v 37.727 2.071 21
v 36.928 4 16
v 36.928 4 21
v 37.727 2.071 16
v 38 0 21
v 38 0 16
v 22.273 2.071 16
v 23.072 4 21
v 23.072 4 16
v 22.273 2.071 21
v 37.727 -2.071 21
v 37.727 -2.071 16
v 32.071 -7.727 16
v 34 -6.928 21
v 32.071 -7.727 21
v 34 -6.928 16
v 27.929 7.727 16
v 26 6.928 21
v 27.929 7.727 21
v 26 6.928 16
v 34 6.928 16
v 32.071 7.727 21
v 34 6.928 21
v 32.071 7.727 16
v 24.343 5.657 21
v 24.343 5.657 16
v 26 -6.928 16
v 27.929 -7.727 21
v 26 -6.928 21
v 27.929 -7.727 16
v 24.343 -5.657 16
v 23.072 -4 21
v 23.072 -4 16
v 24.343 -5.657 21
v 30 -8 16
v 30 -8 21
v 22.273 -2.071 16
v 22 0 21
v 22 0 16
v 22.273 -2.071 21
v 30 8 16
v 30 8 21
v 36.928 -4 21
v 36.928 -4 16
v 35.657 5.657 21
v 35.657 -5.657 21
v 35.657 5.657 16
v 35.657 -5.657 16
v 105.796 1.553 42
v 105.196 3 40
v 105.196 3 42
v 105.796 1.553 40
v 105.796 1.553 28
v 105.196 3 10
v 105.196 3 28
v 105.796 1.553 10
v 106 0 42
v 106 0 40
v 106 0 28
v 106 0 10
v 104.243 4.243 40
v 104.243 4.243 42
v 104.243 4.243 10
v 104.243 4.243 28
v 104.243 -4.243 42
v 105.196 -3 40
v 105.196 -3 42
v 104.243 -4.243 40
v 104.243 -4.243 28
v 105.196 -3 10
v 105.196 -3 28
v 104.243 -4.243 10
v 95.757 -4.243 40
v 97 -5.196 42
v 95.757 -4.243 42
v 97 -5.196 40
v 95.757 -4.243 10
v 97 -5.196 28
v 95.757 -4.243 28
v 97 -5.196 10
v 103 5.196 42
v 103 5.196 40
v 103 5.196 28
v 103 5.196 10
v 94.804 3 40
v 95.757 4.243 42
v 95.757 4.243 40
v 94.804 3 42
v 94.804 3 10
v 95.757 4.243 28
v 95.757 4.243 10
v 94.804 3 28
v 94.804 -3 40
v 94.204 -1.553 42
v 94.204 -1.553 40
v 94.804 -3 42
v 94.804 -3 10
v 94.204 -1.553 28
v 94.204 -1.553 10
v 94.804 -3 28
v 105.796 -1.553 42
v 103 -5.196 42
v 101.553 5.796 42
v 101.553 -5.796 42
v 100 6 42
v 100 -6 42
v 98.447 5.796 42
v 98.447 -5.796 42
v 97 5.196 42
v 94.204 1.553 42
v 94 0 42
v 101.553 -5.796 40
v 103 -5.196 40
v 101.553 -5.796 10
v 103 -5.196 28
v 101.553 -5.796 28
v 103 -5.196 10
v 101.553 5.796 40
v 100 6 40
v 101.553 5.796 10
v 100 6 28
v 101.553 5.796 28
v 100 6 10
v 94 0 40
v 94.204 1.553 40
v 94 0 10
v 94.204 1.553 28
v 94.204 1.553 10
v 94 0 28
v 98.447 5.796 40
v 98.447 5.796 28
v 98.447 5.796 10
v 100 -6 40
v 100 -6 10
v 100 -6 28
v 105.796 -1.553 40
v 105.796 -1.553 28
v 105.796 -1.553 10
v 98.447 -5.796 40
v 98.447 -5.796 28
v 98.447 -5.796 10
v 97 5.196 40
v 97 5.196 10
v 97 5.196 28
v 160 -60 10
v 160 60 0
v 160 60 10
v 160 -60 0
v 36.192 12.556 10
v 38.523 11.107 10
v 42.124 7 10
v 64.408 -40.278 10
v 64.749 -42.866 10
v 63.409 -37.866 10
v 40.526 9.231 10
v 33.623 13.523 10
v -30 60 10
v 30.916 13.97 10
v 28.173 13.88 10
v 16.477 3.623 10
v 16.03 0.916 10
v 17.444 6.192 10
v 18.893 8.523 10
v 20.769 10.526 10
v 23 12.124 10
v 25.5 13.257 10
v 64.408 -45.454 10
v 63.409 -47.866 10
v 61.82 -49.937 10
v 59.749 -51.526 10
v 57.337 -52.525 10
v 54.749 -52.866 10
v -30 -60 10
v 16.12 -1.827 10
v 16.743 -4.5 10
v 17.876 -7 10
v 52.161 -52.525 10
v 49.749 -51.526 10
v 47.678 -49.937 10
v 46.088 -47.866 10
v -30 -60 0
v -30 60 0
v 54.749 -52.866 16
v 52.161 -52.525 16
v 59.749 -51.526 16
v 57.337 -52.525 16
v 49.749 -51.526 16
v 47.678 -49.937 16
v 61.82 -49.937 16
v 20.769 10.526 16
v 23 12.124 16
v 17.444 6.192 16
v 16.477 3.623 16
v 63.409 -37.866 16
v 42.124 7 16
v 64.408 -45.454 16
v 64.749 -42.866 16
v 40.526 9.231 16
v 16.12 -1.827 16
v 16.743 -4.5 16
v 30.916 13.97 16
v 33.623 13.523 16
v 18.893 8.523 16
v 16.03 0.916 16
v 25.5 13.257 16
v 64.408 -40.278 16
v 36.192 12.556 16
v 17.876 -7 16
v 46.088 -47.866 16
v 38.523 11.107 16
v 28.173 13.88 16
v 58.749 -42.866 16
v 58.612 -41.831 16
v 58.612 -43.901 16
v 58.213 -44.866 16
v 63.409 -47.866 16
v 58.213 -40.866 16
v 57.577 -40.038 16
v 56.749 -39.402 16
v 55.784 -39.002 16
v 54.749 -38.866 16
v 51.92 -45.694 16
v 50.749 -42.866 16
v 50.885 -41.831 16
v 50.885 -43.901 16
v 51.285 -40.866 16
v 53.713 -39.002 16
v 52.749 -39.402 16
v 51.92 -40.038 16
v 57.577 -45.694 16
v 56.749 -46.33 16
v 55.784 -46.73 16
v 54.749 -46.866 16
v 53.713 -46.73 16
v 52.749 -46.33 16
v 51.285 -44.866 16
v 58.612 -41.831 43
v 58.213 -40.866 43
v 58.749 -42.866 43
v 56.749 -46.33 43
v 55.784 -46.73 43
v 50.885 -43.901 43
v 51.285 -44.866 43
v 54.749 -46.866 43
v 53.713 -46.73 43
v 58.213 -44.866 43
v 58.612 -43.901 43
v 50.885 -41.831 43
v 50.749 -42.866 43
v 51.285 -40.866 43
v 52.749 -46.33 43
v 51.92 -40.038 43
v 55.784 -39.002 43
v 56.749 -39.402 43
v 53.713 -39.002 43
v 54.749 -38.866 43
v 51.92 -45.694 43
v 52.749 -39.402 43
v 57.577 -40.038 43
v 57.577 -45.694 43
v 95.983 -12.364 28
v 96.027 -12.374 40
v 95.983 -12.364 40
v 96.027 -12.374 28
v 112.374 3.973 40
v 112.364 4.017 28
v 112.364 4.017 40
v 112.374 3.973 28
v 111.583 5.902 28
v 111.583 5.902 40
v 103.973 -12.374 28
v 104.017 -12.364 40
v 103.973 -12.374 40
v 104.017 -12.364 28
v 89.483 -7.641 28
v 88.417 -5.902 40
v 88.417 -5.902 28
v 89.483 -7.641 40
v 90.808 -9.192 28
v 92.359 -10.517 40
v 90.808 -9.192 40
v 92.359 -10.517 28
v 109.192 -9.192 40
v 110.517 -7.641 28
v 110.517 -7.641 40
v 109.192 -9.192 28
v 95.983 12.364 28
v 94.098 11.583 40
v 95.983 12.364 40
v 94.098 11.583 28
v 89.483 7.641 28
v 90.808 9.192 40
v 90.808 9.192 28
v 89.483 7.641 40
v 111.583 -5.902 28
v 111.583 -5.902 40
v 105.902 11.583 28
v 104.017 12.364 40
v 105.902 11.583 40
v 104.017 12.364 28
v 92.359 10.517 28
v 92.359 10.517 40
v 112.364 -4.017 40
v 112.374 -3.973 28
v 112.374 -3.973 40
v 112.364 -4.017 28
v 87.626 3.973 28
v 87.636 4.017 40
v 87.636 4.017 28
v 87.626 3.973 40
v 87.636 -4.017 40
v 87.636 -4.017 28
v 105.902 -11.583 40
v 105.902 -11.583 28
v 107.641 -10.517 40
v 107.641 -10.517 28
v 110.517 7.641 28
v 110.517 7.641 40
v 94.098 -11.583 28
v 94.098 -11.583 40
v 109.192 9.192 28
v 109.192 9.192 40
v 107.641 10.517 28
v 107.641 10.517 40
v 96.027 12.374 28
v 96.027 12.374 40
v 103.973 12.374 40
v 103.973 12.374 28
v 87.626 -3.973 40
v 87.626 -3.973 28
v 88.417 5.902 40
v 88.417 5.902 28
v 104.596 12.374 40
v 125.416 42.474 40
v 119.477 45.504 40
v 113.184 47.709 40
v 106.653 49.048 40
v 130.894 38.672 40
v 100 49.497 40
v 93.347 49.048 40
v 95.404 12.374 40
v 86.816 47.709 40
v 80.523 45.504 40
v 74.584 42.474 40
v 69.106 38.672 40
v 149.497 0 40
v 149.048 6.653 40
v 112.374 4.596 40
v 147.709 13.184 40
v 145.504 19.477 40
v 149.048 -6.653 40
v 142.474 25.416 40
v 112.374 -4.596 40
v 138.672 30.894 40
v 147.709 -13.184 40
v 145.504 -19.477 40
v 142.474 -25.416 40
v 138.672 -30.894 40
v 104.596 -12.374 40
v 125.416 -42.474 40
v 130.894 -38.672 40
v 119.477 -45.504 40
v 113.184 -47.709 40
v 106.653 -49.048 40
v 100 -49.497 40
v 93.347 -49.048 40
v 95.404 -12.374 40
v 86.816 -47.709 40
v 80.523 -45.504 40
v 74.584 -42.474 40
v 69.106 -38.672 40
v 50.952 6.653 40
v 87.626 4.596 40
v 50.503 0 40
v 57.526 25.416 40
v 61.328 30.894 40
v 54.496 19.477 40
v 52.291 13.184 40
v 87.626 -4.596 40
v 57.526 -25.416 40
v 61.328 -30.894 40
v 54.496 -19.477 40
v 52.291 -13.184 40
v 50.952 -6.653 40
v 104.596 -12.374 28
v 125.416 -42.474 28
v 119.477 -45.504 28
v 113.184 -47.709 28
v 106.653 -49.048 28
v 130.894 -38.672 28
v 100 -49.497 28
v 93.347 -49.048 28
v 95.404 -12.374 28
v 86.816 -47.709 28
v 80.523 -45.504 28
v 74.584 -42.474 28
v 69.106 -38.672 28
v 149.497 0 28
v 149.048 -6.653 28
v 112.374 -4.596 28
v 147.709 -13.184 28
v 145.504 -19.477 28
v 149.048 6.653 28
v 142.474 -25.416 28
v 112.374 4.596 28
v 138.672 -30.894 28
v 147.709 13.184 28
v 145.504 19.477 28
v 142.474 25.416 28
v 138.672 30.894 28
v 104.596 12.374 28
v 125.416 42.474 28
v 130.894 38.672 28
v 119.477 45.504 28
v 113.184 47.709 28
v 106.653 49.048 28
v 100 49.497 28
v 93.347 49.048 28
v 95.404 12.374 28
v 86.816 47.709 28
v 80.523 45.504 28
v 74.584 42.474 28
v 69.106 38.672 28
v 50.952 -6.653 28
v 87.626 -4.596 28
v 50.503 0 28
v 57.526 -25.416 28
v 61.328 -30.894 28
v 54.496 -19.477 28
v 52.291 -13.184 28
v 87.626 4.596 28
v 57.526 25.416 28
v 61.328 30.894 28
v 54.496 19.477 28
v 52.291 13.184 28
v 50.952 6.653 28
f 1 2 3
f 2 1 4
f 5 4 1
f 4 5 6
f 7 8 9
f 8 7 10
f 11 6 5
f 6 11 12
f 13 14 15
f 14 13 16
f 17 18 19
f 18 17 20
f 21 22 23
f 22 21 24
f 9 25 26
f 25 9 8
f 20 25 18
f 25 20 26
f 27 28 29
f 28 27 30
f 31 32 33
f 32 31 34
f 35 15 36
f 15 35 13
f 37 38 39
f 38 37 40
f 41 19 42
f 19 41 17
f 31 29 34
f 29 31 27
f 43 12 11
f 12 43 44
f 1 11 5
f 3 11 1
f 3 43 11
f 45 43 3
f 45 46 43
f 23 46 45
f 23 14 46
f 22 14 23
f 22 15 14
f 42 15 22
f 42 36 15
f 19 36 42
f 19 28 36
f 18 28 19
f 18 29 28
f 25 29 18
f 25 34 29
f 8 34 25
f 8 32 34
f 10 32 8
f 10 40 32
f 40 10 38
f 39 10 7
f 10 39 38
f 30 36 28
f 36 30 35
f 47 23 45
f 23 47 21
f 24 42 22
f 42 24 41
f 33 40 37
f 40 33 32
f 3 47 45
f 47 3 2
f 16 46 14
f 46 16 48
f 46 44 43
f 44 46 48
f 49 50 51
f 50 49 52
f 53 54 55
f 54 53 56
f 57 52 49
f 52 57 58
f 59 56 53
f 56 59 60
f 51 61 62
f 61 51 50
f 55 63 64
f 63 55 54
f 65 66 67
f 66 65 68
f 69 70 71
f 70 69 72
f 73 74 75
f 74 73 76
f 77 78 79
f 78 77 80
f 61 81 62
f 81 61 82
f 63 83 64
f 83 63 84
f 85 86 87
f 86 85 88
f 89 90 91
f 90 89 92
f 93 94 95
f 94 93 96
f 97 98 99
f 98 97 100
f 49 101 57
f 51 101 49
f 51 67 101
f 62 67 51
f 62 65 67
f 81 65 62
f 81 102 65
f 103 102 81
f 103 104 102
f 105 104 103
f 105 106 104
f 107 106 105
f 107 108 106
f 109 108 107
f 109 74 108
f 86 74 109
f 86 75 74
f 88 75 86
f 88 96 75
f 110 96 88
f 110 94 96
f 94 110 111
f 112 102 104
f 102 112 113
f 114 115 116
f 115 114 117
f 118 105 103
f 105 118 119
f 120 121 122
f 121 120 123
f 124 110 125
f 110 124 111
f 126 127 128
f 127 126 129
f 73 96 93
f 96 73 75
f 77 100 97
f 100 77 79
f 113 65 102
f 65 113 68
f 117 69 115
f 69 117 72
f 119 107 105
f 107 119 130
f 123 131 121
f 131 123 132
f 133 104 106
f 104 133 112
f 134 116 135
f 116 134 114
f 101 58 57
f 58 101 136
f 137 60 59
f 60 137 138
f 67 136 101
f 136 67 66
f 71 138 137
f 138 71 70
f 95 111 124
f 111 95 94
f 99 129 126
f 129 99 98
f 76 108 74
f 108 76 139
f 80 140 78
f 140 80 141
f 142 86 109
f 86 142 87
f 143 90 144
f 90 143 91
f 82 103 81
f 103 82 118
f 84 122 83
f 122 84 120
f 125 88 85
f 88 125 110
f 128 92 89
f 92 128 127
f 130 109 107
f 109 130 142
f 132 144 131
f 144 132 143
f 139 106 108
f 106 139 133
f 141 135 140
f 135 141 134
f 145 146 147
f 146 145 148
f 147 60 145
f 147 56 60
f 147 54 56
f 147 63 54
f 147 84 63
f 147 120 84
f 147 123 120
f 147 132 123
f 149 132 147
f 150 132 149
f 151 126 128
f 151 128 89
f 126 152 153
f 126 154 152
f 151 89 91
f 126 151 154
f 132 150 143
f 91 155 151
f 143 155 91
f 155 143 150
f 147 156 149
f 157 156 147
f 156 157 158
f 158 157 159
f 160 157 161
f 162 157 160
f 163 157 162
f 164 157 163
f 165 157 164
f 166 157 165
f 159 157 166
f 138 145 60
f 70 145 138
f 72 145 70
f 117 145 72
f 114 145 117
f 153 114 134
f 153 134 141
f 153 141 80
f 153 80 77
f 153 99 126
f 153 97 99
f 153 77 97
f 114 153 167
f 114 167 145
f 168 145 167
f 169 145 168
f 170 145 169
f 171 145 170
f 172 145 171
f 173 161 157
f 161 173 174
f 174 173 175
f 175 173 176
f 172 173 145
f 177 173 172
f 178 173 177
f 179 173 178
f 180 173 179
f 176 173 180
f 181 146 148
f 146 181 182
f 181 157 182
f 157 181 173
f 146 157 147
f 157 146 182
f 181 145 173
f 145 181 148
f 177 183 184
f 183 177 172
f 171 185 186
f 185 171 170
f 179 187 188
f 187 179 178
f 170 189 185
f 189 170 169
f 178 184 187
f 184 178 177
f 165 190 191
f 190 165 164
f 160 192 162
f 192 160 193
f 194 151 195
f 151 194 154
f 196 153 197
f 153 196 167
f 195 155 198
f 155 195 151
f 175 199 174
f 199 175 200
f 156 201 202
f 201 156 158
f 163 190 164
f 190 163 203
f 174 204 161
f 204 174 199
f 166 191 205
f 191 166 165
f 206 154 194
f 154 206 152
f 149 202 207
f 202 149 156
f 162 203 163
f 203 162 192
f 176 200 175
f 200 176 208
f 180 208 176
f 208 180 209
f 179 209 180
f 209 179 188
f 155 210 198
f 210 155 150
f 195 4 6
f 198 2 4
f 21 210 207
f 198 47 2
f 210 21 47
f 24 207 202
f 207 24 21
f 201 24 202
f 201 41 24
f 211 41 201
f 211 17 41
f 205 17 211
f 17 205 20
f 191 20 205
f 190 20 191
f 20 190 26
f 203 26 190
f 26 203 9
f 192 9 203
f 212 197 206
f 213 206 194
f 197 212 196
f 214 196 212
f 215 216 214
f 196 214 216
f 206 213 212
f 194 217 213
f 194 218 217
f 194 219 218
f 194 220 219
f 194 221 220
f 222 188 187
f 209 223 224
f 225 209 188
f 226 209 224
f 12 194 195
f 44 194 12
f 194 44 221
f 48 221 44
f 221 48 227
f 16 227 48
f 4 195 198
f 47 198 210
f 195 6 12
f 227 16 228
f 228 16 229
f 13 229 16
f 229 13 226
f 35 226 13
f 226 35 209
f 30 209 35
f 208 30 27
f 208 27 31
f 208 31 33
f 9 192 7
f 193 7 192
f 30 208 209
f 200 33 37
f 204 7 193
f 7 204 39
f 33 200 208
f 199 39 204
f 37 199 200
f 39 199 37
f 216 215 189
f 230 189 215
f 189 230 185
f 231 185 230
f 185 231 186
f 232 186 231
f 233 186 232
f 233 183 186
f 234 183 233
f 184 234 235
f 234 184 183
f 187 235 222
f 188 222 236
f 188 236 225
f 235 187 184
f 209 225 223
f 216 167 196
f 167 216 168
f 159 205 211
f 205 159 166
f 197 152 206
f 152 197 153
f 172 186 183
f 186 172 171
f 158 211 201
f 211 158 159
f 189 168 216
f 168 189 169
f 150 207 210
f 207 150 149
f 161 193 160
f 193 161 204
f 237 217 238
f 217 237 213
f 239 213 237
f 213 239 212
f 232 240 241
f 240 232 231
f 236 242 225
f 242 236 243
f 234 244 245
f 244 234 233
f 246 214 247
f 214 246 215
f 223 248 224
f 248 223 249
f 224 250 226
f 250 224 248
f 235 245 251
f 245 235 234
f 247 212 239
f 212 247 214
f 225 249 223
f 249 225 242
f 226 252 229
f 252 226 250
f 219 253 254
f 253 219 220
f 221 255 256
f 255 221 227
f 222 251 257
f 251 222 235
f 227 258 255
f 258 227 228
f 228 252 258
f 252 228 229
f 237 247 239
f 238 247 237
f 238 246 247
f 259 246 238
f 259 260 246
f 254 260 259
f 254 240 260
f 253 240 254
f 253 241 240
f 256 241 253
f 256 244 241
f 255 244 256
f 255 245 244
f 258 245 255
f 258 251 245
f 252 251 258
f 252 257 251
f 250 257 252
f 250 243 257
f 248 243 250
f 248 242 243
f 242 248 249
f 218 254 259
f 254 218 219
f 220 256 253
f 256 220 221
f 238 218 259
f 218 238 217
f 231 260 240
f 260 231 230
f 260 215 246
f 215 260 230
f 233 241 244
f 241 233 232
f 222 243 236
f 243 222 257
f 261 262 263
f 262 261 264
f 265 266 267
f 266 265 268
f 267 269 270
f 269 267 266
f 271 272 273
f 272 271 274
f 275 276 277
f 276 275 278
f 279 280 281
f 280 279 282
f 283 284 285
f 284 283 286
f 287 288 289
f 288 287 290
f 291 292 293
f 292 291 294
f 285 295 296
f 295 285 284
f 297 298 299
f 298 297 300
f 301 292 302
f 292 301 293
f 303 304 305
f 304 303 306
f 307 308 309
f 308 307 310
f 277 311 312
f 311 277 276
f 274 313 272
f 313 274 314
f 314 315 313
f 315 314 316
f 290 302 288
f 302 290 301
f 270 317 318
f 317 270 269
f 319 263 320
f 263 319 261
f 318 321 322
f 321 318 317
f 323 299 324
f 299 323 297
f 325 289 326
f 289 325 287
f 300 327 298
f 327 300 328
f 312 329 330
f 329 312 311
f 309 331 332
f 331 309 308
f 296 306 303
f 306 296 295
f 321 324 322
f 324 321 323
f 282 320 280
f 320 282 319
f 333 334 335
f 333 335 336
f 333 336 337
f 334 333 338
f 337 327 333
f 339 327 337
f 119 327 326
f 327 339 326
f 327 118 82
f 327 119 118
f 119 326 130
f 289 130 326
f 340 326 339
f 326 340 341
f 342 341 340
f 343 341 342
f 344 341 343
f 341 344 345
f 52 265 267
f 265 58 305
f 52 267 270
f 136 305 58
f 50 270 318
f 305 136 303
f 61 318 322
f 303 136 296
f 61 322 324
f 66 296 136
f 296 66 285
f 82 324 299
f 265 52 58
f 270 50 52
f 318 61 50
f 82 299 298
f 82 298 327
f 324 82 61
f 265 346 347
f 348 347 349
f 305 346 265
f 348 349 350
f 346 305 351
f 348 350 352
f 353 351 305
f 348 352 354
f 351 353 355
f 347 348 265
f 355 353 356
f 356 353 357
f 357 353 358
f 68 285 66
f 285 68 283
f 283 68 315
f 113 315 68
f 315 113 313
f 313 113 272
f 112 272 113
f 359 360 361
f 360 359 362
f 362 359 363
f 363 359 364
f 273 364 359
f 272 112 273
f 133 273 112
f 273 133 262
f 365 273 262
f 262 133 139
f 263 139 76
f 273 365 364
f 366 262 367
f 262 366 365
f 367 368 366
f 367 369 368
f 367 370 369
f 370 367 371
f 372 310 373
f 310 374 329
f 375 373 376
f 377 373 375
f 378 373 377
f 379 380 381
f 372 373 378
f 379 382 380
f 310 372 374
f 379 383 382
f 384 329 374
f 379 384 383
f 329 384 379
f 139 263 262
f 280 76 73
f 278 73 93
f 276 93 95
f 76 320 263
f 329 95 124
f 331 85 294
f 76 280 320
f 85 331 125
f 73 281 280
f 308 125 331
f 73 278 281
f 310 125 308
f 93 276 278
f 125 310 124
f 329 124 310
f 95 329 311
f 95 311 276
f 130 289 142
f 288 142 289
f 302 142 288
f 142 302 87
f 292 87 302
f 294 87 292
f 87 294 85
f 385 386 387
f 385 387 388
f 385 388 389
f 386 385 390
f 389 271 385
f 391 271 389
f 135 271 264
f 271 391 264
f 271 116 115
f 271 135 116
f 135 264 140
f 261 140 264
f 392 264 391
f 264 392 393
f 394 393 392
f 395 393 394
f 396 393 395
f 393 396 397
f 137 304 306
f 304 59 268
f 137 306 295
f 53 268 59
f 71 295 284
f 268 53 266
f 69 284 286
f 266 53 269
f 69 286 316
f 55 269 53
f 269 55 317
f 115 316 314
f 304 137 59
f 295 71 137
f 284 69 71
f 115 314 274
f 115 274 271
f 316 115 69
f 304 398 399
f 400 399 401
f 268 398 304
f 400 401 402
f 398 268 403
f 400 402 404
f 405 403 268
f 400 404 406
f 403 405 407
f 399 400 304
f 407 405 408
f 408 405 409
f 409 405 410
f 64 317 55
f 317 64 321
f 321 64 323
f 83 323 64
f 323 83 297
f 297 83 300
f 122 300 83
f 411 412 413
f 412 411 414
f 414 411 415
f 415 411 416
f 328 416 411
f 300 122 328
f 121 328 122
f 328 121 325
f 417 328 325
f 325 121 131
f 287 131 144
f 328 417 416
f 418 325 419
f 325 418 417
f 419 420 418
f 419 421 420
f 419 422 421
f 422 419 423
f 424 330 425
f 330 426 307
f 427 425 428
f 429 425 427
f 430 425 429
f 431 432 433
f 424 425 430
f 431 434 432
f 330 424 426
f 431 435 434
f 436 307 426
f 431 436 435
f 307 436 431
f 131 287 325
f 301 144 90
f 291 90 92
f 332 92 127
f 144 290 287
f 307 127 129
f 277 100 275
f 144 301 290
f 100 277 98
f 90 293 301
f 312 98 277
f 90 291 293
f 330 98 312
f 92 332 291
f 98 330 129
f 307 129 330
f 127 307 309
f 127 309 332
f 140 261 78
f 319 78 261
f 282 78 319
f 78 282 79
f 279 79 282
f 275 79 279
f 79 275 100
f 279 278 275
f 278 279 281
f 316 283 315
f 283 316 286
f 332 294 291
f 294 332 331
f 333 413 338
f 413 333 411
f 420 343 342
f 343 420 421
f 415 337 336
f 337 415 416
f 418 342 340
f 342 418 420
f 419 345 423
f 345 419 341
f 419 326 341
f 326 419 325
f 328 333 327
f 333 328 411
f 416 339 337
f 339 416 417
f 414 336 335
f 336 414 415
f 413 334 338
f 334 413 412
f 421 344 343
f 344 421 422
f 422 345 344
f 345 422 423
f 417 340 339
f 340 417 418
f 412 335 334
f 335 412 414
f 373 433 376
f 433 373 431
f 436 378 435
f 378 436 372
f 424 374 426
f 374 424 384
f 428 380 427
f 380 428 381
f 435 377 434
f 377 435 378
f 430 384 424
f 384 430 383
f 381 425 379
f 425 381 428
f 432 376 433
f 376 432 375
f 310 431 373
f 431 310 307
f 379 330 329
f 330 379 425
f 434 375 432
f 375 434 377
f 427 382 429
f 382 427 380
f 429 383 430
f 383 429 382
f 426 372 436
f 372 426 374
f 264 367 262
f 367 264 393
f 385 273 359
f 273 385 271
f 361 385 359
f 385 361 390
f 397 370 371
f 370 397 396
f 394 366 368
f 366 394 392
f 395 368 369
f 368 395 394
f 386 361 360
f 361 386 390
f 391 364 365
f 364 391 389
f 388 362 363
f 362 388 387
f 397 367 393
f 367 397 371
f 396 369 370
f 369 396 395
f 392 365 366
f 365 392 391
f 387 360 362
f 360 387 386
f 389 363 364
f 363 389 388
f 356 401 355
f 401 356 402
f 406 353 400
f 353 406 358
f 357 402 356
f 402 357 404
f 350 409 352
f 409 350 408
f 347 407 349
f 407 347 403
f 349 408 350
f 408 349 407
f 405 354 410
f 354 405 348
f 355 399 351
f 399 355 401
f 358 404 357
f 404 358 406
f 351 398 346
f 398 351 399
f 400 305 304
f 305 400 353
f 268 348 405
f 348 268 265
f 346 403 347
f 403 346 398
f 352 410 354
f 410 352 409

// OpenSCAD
// A Geneva wheel: continuous in, four steps and four stops out.
//
// The driver turns steadily and never stops. The wheel turns a quarter of a turn,
// stops dead, waits three quarters of the driver's revolution, and does it again.
// Nothing here says "index" or "dwell" or "90 degrees". There is a pin on a
// crank, four slots in a disc, and the arithmetic that decides where they go.
//
// That arithmetic is the whole model. For an n-slot wheel at centre distance C,
//
//     crank radius   a = C·sin(180/n)
//     wheel radius   b = C·cos(180/n)
//
// and a² + b² = C² is not a coincidence — it is the condition that the pin's
// circular path crosses the wheel's rim at exactly the angle the slot points.
// Get it right and the pin enters the slot *along* it rather than across it,
// and — this is the part worth watching — the wheel's speed is zero at the moment
// of entry and zero again at exit. It is accelerated from rest and brought back
// to rest by the geometry, which is why a Geneva can be run fast without
// hammering itself apart, and why it needs no brake to hold still between steps.
// It arrives stopped.
//
// The four-slot version is the one that ran cinema projectors: 24 frames a
// second, each yanked into the gate and held perfectly still while it was lit.
//
// ---------------------------------------------------------------------------
// It is built out of convex pieces, and that is the engineering of this model
// rather than a detail of it.
//
// A moving part's collider is its convex hull. A slotted disc's hull is a disc —
// the slots fill straight back in, the pin rides round the outside, and there is
// no mechanism at all. `collider = "decompose"` exists for exactly this, and was
// the first thing tried: it splits a concave part into convex pieces at a cost of
// about a voxel of accuracy. Here that voxel *is* the mechanism. Every clearance
// in a Geneva is a millimetre or two — the fit of the pin in its slot, the depth
// the slot is cut to, the air under the crank — and a collider a voxel oversize
// closes all of them at once. It jammed three separate ways: after 0.9° of the
// first revolution, then after 39°, then after 55°, each time with clear air
// where the drawing said there was clearance and the interference check agreeing
// there was.
//
// So the wheel is a hub with four petals bolted to it, each petal convex, and the
// slots are the gaps between them. Eight parts and six welds against one part and
// none, and every surface is exactly where it was drawn.

module part(name, fixed = false, density = undef, mass = undef,
            collider = undef, friction = undef, bounce = undef) { children(); }
module hinge(name, parts, at, axis, range) { }
module weld(name, parts, at, axis) { }
module drive(name, to, over, at, torque, speed) { }

STEEL   = 0.0078;       // g/mm³
PLASTIC = 0.0012;
DECK    = 10;

SLOTS = 4;
C = 70;                                 // centre distance
A = C * sin(180 / SLOTS);               // the crank's radius: 49.50
B = C * cos(180 / SLOTS);               // and the wheel's:    49.50
PIN = 4;                                // the pin
FIT = 1.5;                              // and its clearance in the slot
HALF = PIN + FIT;                       // so the slot comes out 11 wide

// How deep the slot is cut. The pin's own path bottoms out at C − a = 20.5 from
// the wheel's centre, so its inner face never comes nearer than 16.5; cutting to
// 12 leaves four and a half millimetres it will never need.
SLOT_IN = 12;
HUB = 13;                               // and the hub fills what is left

DRIVE_AT = [30, 0, DECK];
WHEEL_AT = [DRIVE_AT[0] + C, 0, DECK];

// The wheel sits *above* the crank, and only the pin comes up into its plane.
// That is not a detail either — it is the only way the two can overlap at all.
// The crank sweeps a circle 120 mm across about a centre 70 from the wheel, and
// the wheel is 99 across: in one plane they would foul for most of every
// revolution. In two, with a pin bridging them, they meet only where they should.
CRANK_T = 6;
CLEAR   = 12;
WHEEL_Z = DECK + CRANK_T + CLEAR;
THICK   = 12;

// Drawn 15° before the pin reaches the rim, so the first index starts at once and
// there is room for two. Entry is at exactly −45°: cos φ = C / 2a, and with
// a = C/√2 that is √2/2.
START = -60;

// ---- the driver ------------------------------------------------------------
// The crank, and the pin as a separate part bolted to it — which looks like
// over-engineering and is the other thing that makes this mechanism run.
//
// Drawn as one part, the hull of a flat crank with a tall thin pin at one end of
// it is neither: it is the tapered wedge *between* them, swelling from the pin's
// 4 mm at the top to the crank's 10 at the bottom. That wedge fills exactly the
// gap the crank was dropped out of the wheel's plane to make, and the two touch
// through it. The symptom was a crank that turned to the same angle whatever it
// started from — from −60°, from −90°, from −180°, always to −56° — and stopped
// dead there, with 4.6 mm of clear air between the pin and the rim.
part("driver", density = STEEL)
    color("indianred") translate(DRIVE_AT) rotate([0, 0, START])
        hull() {
            cylinder(h = CRANK_T, r = 14, $fn = 32);
            translate([A, 0, 0]) cylinder(h = CRANK_T, r = 10, $fn = 24);
        }
hinge("crank", parts = ["driver", "frame"], at = DRIVE_AT, axis = [0, 0, 1]);
drive("crank", speed = 180, torque = 4000000);

PIN_AT = [DRIVE_AT[0] + A * cos(START), A * sin(START), DRIVE_AT[2] + CRANK_T - 1];
part("pin", density = STEEL)
    color("firebrick") translate(PIN_AT)
        cylinder(h = CLEAR + THICK + 4, r = PIN, $fn = 24);
weld("pin_bolts", parts = ["pin", "driver"], at = PIN_AT, axis = [0, 0, 1]);

// ---- the wheel -------------------------------------------------------------
// A hub, and four petals bolted to it. Each petal is bounded by two straight slot
// walls, an arc of the rim, and a chord across its inside — convex, so its hull
// is its shape and the slot beside it is exactly as wide as it was drawn.
function petal(i, steps) =
    let (s0 = 180 / SLOTS + i * 360 / SLOTS,
         s1 = s0 + 360 / SLOTS,
         d  = asin(HALF / B))
    concat(
        [[SLOT_IN * cos(s0) - HALF * sin(s0), SLOT_IN * sin(s0) + HALF * cos(s0)]],
        [for (k = [0 : steps])
            let (t = (s0 + d) + ((s1 - d) - (s0 + d)) * k / steps)
            [B * cos(t), B * sin(t)]],
        [[SLOT_IN * cos(s1) + HALF * sin(s1), SLOT_IN * sin(s1) - HALF * cos(s1)]]);

module petal_at(i) {
    translate([WHEEL_AT[0], WHEEL_AT[1], WHEEL_Z])
        linear_extrude(height = THICK) polygon(points = petal(i, 10));
}
// Where a petal's inner chord crosses the hub, which is where its bolts go.
function spoke(i) =
    let (t = 90 + i * 90)
    [WHEEL_AT[0] + 12.6 * cos(t), WHEEL_AT[1] + 12.6 * sin(t), WHEEL_Z + THICK / 2];

part("hub", density = PLASTIC, friction = 0.05)
    color("steelblue") translate([WHEEL_AT[0], WHEEL_AT[1], WHEEL_Z])
        cylinder(h = THICK, r = HUB, $fn = 40);
hinge("index", parts = ["hub", "frame"], at = WHEEL_AT, axis = [0, 0, 1]);

// Drawn one at a time rather than in a loop, because each is its own part and a
// part needs a name of its own.
part("petal_a", density = PLASTIC, friction = 0.05) color("steelblue") petal_at(0);
weld("spoke_a", parts = ["petal_a", "hub"], at = spoke(0), axis = [0, 0, 1]);

part("petal_b", density = PLASTIC, friction = 0.05) color("steelblue") petal_at(1);
weld("spoke_b", parts = ["petal_b", "hub"], at = spoke(1), axis = [0, 0, 1]);

part("petal_c", density = PLASTIC, friction = 0.05) color("steelblue") petal_at(2);
weld("spoke_c", parts = ["petal_c", "hub"], at = spoke(2), axis = [0, 0, 1]);

part("petal_d", density = PLASTIC, friction = 0.05) color("steelblue") petal_at(3);
weld("spoke_d", parts = ["petal_d", "hub"], at = spoke(3), axis = [0, 0, 1]);

// ---- the frame -------------------------------------------------------------
// A deck and two shafts, each thinner than the hub it carries.
part("frame", fixed = true)
    color("slategray") {
        translate([-30, -60, 0]) cube([190, 120, DECK]);
        color("dimgray") {
            translate(DRIVE_AT) translate([0, 0, -1]) cylinder(h = 12, r = 8, $fn = 24);
            translate(WHEEL_AT) translate([0, 0, -1])
                cylinder(h = WHEEL_Z + THICK - DECK + 3, r = 6, $fn = 24);
        }
    }
